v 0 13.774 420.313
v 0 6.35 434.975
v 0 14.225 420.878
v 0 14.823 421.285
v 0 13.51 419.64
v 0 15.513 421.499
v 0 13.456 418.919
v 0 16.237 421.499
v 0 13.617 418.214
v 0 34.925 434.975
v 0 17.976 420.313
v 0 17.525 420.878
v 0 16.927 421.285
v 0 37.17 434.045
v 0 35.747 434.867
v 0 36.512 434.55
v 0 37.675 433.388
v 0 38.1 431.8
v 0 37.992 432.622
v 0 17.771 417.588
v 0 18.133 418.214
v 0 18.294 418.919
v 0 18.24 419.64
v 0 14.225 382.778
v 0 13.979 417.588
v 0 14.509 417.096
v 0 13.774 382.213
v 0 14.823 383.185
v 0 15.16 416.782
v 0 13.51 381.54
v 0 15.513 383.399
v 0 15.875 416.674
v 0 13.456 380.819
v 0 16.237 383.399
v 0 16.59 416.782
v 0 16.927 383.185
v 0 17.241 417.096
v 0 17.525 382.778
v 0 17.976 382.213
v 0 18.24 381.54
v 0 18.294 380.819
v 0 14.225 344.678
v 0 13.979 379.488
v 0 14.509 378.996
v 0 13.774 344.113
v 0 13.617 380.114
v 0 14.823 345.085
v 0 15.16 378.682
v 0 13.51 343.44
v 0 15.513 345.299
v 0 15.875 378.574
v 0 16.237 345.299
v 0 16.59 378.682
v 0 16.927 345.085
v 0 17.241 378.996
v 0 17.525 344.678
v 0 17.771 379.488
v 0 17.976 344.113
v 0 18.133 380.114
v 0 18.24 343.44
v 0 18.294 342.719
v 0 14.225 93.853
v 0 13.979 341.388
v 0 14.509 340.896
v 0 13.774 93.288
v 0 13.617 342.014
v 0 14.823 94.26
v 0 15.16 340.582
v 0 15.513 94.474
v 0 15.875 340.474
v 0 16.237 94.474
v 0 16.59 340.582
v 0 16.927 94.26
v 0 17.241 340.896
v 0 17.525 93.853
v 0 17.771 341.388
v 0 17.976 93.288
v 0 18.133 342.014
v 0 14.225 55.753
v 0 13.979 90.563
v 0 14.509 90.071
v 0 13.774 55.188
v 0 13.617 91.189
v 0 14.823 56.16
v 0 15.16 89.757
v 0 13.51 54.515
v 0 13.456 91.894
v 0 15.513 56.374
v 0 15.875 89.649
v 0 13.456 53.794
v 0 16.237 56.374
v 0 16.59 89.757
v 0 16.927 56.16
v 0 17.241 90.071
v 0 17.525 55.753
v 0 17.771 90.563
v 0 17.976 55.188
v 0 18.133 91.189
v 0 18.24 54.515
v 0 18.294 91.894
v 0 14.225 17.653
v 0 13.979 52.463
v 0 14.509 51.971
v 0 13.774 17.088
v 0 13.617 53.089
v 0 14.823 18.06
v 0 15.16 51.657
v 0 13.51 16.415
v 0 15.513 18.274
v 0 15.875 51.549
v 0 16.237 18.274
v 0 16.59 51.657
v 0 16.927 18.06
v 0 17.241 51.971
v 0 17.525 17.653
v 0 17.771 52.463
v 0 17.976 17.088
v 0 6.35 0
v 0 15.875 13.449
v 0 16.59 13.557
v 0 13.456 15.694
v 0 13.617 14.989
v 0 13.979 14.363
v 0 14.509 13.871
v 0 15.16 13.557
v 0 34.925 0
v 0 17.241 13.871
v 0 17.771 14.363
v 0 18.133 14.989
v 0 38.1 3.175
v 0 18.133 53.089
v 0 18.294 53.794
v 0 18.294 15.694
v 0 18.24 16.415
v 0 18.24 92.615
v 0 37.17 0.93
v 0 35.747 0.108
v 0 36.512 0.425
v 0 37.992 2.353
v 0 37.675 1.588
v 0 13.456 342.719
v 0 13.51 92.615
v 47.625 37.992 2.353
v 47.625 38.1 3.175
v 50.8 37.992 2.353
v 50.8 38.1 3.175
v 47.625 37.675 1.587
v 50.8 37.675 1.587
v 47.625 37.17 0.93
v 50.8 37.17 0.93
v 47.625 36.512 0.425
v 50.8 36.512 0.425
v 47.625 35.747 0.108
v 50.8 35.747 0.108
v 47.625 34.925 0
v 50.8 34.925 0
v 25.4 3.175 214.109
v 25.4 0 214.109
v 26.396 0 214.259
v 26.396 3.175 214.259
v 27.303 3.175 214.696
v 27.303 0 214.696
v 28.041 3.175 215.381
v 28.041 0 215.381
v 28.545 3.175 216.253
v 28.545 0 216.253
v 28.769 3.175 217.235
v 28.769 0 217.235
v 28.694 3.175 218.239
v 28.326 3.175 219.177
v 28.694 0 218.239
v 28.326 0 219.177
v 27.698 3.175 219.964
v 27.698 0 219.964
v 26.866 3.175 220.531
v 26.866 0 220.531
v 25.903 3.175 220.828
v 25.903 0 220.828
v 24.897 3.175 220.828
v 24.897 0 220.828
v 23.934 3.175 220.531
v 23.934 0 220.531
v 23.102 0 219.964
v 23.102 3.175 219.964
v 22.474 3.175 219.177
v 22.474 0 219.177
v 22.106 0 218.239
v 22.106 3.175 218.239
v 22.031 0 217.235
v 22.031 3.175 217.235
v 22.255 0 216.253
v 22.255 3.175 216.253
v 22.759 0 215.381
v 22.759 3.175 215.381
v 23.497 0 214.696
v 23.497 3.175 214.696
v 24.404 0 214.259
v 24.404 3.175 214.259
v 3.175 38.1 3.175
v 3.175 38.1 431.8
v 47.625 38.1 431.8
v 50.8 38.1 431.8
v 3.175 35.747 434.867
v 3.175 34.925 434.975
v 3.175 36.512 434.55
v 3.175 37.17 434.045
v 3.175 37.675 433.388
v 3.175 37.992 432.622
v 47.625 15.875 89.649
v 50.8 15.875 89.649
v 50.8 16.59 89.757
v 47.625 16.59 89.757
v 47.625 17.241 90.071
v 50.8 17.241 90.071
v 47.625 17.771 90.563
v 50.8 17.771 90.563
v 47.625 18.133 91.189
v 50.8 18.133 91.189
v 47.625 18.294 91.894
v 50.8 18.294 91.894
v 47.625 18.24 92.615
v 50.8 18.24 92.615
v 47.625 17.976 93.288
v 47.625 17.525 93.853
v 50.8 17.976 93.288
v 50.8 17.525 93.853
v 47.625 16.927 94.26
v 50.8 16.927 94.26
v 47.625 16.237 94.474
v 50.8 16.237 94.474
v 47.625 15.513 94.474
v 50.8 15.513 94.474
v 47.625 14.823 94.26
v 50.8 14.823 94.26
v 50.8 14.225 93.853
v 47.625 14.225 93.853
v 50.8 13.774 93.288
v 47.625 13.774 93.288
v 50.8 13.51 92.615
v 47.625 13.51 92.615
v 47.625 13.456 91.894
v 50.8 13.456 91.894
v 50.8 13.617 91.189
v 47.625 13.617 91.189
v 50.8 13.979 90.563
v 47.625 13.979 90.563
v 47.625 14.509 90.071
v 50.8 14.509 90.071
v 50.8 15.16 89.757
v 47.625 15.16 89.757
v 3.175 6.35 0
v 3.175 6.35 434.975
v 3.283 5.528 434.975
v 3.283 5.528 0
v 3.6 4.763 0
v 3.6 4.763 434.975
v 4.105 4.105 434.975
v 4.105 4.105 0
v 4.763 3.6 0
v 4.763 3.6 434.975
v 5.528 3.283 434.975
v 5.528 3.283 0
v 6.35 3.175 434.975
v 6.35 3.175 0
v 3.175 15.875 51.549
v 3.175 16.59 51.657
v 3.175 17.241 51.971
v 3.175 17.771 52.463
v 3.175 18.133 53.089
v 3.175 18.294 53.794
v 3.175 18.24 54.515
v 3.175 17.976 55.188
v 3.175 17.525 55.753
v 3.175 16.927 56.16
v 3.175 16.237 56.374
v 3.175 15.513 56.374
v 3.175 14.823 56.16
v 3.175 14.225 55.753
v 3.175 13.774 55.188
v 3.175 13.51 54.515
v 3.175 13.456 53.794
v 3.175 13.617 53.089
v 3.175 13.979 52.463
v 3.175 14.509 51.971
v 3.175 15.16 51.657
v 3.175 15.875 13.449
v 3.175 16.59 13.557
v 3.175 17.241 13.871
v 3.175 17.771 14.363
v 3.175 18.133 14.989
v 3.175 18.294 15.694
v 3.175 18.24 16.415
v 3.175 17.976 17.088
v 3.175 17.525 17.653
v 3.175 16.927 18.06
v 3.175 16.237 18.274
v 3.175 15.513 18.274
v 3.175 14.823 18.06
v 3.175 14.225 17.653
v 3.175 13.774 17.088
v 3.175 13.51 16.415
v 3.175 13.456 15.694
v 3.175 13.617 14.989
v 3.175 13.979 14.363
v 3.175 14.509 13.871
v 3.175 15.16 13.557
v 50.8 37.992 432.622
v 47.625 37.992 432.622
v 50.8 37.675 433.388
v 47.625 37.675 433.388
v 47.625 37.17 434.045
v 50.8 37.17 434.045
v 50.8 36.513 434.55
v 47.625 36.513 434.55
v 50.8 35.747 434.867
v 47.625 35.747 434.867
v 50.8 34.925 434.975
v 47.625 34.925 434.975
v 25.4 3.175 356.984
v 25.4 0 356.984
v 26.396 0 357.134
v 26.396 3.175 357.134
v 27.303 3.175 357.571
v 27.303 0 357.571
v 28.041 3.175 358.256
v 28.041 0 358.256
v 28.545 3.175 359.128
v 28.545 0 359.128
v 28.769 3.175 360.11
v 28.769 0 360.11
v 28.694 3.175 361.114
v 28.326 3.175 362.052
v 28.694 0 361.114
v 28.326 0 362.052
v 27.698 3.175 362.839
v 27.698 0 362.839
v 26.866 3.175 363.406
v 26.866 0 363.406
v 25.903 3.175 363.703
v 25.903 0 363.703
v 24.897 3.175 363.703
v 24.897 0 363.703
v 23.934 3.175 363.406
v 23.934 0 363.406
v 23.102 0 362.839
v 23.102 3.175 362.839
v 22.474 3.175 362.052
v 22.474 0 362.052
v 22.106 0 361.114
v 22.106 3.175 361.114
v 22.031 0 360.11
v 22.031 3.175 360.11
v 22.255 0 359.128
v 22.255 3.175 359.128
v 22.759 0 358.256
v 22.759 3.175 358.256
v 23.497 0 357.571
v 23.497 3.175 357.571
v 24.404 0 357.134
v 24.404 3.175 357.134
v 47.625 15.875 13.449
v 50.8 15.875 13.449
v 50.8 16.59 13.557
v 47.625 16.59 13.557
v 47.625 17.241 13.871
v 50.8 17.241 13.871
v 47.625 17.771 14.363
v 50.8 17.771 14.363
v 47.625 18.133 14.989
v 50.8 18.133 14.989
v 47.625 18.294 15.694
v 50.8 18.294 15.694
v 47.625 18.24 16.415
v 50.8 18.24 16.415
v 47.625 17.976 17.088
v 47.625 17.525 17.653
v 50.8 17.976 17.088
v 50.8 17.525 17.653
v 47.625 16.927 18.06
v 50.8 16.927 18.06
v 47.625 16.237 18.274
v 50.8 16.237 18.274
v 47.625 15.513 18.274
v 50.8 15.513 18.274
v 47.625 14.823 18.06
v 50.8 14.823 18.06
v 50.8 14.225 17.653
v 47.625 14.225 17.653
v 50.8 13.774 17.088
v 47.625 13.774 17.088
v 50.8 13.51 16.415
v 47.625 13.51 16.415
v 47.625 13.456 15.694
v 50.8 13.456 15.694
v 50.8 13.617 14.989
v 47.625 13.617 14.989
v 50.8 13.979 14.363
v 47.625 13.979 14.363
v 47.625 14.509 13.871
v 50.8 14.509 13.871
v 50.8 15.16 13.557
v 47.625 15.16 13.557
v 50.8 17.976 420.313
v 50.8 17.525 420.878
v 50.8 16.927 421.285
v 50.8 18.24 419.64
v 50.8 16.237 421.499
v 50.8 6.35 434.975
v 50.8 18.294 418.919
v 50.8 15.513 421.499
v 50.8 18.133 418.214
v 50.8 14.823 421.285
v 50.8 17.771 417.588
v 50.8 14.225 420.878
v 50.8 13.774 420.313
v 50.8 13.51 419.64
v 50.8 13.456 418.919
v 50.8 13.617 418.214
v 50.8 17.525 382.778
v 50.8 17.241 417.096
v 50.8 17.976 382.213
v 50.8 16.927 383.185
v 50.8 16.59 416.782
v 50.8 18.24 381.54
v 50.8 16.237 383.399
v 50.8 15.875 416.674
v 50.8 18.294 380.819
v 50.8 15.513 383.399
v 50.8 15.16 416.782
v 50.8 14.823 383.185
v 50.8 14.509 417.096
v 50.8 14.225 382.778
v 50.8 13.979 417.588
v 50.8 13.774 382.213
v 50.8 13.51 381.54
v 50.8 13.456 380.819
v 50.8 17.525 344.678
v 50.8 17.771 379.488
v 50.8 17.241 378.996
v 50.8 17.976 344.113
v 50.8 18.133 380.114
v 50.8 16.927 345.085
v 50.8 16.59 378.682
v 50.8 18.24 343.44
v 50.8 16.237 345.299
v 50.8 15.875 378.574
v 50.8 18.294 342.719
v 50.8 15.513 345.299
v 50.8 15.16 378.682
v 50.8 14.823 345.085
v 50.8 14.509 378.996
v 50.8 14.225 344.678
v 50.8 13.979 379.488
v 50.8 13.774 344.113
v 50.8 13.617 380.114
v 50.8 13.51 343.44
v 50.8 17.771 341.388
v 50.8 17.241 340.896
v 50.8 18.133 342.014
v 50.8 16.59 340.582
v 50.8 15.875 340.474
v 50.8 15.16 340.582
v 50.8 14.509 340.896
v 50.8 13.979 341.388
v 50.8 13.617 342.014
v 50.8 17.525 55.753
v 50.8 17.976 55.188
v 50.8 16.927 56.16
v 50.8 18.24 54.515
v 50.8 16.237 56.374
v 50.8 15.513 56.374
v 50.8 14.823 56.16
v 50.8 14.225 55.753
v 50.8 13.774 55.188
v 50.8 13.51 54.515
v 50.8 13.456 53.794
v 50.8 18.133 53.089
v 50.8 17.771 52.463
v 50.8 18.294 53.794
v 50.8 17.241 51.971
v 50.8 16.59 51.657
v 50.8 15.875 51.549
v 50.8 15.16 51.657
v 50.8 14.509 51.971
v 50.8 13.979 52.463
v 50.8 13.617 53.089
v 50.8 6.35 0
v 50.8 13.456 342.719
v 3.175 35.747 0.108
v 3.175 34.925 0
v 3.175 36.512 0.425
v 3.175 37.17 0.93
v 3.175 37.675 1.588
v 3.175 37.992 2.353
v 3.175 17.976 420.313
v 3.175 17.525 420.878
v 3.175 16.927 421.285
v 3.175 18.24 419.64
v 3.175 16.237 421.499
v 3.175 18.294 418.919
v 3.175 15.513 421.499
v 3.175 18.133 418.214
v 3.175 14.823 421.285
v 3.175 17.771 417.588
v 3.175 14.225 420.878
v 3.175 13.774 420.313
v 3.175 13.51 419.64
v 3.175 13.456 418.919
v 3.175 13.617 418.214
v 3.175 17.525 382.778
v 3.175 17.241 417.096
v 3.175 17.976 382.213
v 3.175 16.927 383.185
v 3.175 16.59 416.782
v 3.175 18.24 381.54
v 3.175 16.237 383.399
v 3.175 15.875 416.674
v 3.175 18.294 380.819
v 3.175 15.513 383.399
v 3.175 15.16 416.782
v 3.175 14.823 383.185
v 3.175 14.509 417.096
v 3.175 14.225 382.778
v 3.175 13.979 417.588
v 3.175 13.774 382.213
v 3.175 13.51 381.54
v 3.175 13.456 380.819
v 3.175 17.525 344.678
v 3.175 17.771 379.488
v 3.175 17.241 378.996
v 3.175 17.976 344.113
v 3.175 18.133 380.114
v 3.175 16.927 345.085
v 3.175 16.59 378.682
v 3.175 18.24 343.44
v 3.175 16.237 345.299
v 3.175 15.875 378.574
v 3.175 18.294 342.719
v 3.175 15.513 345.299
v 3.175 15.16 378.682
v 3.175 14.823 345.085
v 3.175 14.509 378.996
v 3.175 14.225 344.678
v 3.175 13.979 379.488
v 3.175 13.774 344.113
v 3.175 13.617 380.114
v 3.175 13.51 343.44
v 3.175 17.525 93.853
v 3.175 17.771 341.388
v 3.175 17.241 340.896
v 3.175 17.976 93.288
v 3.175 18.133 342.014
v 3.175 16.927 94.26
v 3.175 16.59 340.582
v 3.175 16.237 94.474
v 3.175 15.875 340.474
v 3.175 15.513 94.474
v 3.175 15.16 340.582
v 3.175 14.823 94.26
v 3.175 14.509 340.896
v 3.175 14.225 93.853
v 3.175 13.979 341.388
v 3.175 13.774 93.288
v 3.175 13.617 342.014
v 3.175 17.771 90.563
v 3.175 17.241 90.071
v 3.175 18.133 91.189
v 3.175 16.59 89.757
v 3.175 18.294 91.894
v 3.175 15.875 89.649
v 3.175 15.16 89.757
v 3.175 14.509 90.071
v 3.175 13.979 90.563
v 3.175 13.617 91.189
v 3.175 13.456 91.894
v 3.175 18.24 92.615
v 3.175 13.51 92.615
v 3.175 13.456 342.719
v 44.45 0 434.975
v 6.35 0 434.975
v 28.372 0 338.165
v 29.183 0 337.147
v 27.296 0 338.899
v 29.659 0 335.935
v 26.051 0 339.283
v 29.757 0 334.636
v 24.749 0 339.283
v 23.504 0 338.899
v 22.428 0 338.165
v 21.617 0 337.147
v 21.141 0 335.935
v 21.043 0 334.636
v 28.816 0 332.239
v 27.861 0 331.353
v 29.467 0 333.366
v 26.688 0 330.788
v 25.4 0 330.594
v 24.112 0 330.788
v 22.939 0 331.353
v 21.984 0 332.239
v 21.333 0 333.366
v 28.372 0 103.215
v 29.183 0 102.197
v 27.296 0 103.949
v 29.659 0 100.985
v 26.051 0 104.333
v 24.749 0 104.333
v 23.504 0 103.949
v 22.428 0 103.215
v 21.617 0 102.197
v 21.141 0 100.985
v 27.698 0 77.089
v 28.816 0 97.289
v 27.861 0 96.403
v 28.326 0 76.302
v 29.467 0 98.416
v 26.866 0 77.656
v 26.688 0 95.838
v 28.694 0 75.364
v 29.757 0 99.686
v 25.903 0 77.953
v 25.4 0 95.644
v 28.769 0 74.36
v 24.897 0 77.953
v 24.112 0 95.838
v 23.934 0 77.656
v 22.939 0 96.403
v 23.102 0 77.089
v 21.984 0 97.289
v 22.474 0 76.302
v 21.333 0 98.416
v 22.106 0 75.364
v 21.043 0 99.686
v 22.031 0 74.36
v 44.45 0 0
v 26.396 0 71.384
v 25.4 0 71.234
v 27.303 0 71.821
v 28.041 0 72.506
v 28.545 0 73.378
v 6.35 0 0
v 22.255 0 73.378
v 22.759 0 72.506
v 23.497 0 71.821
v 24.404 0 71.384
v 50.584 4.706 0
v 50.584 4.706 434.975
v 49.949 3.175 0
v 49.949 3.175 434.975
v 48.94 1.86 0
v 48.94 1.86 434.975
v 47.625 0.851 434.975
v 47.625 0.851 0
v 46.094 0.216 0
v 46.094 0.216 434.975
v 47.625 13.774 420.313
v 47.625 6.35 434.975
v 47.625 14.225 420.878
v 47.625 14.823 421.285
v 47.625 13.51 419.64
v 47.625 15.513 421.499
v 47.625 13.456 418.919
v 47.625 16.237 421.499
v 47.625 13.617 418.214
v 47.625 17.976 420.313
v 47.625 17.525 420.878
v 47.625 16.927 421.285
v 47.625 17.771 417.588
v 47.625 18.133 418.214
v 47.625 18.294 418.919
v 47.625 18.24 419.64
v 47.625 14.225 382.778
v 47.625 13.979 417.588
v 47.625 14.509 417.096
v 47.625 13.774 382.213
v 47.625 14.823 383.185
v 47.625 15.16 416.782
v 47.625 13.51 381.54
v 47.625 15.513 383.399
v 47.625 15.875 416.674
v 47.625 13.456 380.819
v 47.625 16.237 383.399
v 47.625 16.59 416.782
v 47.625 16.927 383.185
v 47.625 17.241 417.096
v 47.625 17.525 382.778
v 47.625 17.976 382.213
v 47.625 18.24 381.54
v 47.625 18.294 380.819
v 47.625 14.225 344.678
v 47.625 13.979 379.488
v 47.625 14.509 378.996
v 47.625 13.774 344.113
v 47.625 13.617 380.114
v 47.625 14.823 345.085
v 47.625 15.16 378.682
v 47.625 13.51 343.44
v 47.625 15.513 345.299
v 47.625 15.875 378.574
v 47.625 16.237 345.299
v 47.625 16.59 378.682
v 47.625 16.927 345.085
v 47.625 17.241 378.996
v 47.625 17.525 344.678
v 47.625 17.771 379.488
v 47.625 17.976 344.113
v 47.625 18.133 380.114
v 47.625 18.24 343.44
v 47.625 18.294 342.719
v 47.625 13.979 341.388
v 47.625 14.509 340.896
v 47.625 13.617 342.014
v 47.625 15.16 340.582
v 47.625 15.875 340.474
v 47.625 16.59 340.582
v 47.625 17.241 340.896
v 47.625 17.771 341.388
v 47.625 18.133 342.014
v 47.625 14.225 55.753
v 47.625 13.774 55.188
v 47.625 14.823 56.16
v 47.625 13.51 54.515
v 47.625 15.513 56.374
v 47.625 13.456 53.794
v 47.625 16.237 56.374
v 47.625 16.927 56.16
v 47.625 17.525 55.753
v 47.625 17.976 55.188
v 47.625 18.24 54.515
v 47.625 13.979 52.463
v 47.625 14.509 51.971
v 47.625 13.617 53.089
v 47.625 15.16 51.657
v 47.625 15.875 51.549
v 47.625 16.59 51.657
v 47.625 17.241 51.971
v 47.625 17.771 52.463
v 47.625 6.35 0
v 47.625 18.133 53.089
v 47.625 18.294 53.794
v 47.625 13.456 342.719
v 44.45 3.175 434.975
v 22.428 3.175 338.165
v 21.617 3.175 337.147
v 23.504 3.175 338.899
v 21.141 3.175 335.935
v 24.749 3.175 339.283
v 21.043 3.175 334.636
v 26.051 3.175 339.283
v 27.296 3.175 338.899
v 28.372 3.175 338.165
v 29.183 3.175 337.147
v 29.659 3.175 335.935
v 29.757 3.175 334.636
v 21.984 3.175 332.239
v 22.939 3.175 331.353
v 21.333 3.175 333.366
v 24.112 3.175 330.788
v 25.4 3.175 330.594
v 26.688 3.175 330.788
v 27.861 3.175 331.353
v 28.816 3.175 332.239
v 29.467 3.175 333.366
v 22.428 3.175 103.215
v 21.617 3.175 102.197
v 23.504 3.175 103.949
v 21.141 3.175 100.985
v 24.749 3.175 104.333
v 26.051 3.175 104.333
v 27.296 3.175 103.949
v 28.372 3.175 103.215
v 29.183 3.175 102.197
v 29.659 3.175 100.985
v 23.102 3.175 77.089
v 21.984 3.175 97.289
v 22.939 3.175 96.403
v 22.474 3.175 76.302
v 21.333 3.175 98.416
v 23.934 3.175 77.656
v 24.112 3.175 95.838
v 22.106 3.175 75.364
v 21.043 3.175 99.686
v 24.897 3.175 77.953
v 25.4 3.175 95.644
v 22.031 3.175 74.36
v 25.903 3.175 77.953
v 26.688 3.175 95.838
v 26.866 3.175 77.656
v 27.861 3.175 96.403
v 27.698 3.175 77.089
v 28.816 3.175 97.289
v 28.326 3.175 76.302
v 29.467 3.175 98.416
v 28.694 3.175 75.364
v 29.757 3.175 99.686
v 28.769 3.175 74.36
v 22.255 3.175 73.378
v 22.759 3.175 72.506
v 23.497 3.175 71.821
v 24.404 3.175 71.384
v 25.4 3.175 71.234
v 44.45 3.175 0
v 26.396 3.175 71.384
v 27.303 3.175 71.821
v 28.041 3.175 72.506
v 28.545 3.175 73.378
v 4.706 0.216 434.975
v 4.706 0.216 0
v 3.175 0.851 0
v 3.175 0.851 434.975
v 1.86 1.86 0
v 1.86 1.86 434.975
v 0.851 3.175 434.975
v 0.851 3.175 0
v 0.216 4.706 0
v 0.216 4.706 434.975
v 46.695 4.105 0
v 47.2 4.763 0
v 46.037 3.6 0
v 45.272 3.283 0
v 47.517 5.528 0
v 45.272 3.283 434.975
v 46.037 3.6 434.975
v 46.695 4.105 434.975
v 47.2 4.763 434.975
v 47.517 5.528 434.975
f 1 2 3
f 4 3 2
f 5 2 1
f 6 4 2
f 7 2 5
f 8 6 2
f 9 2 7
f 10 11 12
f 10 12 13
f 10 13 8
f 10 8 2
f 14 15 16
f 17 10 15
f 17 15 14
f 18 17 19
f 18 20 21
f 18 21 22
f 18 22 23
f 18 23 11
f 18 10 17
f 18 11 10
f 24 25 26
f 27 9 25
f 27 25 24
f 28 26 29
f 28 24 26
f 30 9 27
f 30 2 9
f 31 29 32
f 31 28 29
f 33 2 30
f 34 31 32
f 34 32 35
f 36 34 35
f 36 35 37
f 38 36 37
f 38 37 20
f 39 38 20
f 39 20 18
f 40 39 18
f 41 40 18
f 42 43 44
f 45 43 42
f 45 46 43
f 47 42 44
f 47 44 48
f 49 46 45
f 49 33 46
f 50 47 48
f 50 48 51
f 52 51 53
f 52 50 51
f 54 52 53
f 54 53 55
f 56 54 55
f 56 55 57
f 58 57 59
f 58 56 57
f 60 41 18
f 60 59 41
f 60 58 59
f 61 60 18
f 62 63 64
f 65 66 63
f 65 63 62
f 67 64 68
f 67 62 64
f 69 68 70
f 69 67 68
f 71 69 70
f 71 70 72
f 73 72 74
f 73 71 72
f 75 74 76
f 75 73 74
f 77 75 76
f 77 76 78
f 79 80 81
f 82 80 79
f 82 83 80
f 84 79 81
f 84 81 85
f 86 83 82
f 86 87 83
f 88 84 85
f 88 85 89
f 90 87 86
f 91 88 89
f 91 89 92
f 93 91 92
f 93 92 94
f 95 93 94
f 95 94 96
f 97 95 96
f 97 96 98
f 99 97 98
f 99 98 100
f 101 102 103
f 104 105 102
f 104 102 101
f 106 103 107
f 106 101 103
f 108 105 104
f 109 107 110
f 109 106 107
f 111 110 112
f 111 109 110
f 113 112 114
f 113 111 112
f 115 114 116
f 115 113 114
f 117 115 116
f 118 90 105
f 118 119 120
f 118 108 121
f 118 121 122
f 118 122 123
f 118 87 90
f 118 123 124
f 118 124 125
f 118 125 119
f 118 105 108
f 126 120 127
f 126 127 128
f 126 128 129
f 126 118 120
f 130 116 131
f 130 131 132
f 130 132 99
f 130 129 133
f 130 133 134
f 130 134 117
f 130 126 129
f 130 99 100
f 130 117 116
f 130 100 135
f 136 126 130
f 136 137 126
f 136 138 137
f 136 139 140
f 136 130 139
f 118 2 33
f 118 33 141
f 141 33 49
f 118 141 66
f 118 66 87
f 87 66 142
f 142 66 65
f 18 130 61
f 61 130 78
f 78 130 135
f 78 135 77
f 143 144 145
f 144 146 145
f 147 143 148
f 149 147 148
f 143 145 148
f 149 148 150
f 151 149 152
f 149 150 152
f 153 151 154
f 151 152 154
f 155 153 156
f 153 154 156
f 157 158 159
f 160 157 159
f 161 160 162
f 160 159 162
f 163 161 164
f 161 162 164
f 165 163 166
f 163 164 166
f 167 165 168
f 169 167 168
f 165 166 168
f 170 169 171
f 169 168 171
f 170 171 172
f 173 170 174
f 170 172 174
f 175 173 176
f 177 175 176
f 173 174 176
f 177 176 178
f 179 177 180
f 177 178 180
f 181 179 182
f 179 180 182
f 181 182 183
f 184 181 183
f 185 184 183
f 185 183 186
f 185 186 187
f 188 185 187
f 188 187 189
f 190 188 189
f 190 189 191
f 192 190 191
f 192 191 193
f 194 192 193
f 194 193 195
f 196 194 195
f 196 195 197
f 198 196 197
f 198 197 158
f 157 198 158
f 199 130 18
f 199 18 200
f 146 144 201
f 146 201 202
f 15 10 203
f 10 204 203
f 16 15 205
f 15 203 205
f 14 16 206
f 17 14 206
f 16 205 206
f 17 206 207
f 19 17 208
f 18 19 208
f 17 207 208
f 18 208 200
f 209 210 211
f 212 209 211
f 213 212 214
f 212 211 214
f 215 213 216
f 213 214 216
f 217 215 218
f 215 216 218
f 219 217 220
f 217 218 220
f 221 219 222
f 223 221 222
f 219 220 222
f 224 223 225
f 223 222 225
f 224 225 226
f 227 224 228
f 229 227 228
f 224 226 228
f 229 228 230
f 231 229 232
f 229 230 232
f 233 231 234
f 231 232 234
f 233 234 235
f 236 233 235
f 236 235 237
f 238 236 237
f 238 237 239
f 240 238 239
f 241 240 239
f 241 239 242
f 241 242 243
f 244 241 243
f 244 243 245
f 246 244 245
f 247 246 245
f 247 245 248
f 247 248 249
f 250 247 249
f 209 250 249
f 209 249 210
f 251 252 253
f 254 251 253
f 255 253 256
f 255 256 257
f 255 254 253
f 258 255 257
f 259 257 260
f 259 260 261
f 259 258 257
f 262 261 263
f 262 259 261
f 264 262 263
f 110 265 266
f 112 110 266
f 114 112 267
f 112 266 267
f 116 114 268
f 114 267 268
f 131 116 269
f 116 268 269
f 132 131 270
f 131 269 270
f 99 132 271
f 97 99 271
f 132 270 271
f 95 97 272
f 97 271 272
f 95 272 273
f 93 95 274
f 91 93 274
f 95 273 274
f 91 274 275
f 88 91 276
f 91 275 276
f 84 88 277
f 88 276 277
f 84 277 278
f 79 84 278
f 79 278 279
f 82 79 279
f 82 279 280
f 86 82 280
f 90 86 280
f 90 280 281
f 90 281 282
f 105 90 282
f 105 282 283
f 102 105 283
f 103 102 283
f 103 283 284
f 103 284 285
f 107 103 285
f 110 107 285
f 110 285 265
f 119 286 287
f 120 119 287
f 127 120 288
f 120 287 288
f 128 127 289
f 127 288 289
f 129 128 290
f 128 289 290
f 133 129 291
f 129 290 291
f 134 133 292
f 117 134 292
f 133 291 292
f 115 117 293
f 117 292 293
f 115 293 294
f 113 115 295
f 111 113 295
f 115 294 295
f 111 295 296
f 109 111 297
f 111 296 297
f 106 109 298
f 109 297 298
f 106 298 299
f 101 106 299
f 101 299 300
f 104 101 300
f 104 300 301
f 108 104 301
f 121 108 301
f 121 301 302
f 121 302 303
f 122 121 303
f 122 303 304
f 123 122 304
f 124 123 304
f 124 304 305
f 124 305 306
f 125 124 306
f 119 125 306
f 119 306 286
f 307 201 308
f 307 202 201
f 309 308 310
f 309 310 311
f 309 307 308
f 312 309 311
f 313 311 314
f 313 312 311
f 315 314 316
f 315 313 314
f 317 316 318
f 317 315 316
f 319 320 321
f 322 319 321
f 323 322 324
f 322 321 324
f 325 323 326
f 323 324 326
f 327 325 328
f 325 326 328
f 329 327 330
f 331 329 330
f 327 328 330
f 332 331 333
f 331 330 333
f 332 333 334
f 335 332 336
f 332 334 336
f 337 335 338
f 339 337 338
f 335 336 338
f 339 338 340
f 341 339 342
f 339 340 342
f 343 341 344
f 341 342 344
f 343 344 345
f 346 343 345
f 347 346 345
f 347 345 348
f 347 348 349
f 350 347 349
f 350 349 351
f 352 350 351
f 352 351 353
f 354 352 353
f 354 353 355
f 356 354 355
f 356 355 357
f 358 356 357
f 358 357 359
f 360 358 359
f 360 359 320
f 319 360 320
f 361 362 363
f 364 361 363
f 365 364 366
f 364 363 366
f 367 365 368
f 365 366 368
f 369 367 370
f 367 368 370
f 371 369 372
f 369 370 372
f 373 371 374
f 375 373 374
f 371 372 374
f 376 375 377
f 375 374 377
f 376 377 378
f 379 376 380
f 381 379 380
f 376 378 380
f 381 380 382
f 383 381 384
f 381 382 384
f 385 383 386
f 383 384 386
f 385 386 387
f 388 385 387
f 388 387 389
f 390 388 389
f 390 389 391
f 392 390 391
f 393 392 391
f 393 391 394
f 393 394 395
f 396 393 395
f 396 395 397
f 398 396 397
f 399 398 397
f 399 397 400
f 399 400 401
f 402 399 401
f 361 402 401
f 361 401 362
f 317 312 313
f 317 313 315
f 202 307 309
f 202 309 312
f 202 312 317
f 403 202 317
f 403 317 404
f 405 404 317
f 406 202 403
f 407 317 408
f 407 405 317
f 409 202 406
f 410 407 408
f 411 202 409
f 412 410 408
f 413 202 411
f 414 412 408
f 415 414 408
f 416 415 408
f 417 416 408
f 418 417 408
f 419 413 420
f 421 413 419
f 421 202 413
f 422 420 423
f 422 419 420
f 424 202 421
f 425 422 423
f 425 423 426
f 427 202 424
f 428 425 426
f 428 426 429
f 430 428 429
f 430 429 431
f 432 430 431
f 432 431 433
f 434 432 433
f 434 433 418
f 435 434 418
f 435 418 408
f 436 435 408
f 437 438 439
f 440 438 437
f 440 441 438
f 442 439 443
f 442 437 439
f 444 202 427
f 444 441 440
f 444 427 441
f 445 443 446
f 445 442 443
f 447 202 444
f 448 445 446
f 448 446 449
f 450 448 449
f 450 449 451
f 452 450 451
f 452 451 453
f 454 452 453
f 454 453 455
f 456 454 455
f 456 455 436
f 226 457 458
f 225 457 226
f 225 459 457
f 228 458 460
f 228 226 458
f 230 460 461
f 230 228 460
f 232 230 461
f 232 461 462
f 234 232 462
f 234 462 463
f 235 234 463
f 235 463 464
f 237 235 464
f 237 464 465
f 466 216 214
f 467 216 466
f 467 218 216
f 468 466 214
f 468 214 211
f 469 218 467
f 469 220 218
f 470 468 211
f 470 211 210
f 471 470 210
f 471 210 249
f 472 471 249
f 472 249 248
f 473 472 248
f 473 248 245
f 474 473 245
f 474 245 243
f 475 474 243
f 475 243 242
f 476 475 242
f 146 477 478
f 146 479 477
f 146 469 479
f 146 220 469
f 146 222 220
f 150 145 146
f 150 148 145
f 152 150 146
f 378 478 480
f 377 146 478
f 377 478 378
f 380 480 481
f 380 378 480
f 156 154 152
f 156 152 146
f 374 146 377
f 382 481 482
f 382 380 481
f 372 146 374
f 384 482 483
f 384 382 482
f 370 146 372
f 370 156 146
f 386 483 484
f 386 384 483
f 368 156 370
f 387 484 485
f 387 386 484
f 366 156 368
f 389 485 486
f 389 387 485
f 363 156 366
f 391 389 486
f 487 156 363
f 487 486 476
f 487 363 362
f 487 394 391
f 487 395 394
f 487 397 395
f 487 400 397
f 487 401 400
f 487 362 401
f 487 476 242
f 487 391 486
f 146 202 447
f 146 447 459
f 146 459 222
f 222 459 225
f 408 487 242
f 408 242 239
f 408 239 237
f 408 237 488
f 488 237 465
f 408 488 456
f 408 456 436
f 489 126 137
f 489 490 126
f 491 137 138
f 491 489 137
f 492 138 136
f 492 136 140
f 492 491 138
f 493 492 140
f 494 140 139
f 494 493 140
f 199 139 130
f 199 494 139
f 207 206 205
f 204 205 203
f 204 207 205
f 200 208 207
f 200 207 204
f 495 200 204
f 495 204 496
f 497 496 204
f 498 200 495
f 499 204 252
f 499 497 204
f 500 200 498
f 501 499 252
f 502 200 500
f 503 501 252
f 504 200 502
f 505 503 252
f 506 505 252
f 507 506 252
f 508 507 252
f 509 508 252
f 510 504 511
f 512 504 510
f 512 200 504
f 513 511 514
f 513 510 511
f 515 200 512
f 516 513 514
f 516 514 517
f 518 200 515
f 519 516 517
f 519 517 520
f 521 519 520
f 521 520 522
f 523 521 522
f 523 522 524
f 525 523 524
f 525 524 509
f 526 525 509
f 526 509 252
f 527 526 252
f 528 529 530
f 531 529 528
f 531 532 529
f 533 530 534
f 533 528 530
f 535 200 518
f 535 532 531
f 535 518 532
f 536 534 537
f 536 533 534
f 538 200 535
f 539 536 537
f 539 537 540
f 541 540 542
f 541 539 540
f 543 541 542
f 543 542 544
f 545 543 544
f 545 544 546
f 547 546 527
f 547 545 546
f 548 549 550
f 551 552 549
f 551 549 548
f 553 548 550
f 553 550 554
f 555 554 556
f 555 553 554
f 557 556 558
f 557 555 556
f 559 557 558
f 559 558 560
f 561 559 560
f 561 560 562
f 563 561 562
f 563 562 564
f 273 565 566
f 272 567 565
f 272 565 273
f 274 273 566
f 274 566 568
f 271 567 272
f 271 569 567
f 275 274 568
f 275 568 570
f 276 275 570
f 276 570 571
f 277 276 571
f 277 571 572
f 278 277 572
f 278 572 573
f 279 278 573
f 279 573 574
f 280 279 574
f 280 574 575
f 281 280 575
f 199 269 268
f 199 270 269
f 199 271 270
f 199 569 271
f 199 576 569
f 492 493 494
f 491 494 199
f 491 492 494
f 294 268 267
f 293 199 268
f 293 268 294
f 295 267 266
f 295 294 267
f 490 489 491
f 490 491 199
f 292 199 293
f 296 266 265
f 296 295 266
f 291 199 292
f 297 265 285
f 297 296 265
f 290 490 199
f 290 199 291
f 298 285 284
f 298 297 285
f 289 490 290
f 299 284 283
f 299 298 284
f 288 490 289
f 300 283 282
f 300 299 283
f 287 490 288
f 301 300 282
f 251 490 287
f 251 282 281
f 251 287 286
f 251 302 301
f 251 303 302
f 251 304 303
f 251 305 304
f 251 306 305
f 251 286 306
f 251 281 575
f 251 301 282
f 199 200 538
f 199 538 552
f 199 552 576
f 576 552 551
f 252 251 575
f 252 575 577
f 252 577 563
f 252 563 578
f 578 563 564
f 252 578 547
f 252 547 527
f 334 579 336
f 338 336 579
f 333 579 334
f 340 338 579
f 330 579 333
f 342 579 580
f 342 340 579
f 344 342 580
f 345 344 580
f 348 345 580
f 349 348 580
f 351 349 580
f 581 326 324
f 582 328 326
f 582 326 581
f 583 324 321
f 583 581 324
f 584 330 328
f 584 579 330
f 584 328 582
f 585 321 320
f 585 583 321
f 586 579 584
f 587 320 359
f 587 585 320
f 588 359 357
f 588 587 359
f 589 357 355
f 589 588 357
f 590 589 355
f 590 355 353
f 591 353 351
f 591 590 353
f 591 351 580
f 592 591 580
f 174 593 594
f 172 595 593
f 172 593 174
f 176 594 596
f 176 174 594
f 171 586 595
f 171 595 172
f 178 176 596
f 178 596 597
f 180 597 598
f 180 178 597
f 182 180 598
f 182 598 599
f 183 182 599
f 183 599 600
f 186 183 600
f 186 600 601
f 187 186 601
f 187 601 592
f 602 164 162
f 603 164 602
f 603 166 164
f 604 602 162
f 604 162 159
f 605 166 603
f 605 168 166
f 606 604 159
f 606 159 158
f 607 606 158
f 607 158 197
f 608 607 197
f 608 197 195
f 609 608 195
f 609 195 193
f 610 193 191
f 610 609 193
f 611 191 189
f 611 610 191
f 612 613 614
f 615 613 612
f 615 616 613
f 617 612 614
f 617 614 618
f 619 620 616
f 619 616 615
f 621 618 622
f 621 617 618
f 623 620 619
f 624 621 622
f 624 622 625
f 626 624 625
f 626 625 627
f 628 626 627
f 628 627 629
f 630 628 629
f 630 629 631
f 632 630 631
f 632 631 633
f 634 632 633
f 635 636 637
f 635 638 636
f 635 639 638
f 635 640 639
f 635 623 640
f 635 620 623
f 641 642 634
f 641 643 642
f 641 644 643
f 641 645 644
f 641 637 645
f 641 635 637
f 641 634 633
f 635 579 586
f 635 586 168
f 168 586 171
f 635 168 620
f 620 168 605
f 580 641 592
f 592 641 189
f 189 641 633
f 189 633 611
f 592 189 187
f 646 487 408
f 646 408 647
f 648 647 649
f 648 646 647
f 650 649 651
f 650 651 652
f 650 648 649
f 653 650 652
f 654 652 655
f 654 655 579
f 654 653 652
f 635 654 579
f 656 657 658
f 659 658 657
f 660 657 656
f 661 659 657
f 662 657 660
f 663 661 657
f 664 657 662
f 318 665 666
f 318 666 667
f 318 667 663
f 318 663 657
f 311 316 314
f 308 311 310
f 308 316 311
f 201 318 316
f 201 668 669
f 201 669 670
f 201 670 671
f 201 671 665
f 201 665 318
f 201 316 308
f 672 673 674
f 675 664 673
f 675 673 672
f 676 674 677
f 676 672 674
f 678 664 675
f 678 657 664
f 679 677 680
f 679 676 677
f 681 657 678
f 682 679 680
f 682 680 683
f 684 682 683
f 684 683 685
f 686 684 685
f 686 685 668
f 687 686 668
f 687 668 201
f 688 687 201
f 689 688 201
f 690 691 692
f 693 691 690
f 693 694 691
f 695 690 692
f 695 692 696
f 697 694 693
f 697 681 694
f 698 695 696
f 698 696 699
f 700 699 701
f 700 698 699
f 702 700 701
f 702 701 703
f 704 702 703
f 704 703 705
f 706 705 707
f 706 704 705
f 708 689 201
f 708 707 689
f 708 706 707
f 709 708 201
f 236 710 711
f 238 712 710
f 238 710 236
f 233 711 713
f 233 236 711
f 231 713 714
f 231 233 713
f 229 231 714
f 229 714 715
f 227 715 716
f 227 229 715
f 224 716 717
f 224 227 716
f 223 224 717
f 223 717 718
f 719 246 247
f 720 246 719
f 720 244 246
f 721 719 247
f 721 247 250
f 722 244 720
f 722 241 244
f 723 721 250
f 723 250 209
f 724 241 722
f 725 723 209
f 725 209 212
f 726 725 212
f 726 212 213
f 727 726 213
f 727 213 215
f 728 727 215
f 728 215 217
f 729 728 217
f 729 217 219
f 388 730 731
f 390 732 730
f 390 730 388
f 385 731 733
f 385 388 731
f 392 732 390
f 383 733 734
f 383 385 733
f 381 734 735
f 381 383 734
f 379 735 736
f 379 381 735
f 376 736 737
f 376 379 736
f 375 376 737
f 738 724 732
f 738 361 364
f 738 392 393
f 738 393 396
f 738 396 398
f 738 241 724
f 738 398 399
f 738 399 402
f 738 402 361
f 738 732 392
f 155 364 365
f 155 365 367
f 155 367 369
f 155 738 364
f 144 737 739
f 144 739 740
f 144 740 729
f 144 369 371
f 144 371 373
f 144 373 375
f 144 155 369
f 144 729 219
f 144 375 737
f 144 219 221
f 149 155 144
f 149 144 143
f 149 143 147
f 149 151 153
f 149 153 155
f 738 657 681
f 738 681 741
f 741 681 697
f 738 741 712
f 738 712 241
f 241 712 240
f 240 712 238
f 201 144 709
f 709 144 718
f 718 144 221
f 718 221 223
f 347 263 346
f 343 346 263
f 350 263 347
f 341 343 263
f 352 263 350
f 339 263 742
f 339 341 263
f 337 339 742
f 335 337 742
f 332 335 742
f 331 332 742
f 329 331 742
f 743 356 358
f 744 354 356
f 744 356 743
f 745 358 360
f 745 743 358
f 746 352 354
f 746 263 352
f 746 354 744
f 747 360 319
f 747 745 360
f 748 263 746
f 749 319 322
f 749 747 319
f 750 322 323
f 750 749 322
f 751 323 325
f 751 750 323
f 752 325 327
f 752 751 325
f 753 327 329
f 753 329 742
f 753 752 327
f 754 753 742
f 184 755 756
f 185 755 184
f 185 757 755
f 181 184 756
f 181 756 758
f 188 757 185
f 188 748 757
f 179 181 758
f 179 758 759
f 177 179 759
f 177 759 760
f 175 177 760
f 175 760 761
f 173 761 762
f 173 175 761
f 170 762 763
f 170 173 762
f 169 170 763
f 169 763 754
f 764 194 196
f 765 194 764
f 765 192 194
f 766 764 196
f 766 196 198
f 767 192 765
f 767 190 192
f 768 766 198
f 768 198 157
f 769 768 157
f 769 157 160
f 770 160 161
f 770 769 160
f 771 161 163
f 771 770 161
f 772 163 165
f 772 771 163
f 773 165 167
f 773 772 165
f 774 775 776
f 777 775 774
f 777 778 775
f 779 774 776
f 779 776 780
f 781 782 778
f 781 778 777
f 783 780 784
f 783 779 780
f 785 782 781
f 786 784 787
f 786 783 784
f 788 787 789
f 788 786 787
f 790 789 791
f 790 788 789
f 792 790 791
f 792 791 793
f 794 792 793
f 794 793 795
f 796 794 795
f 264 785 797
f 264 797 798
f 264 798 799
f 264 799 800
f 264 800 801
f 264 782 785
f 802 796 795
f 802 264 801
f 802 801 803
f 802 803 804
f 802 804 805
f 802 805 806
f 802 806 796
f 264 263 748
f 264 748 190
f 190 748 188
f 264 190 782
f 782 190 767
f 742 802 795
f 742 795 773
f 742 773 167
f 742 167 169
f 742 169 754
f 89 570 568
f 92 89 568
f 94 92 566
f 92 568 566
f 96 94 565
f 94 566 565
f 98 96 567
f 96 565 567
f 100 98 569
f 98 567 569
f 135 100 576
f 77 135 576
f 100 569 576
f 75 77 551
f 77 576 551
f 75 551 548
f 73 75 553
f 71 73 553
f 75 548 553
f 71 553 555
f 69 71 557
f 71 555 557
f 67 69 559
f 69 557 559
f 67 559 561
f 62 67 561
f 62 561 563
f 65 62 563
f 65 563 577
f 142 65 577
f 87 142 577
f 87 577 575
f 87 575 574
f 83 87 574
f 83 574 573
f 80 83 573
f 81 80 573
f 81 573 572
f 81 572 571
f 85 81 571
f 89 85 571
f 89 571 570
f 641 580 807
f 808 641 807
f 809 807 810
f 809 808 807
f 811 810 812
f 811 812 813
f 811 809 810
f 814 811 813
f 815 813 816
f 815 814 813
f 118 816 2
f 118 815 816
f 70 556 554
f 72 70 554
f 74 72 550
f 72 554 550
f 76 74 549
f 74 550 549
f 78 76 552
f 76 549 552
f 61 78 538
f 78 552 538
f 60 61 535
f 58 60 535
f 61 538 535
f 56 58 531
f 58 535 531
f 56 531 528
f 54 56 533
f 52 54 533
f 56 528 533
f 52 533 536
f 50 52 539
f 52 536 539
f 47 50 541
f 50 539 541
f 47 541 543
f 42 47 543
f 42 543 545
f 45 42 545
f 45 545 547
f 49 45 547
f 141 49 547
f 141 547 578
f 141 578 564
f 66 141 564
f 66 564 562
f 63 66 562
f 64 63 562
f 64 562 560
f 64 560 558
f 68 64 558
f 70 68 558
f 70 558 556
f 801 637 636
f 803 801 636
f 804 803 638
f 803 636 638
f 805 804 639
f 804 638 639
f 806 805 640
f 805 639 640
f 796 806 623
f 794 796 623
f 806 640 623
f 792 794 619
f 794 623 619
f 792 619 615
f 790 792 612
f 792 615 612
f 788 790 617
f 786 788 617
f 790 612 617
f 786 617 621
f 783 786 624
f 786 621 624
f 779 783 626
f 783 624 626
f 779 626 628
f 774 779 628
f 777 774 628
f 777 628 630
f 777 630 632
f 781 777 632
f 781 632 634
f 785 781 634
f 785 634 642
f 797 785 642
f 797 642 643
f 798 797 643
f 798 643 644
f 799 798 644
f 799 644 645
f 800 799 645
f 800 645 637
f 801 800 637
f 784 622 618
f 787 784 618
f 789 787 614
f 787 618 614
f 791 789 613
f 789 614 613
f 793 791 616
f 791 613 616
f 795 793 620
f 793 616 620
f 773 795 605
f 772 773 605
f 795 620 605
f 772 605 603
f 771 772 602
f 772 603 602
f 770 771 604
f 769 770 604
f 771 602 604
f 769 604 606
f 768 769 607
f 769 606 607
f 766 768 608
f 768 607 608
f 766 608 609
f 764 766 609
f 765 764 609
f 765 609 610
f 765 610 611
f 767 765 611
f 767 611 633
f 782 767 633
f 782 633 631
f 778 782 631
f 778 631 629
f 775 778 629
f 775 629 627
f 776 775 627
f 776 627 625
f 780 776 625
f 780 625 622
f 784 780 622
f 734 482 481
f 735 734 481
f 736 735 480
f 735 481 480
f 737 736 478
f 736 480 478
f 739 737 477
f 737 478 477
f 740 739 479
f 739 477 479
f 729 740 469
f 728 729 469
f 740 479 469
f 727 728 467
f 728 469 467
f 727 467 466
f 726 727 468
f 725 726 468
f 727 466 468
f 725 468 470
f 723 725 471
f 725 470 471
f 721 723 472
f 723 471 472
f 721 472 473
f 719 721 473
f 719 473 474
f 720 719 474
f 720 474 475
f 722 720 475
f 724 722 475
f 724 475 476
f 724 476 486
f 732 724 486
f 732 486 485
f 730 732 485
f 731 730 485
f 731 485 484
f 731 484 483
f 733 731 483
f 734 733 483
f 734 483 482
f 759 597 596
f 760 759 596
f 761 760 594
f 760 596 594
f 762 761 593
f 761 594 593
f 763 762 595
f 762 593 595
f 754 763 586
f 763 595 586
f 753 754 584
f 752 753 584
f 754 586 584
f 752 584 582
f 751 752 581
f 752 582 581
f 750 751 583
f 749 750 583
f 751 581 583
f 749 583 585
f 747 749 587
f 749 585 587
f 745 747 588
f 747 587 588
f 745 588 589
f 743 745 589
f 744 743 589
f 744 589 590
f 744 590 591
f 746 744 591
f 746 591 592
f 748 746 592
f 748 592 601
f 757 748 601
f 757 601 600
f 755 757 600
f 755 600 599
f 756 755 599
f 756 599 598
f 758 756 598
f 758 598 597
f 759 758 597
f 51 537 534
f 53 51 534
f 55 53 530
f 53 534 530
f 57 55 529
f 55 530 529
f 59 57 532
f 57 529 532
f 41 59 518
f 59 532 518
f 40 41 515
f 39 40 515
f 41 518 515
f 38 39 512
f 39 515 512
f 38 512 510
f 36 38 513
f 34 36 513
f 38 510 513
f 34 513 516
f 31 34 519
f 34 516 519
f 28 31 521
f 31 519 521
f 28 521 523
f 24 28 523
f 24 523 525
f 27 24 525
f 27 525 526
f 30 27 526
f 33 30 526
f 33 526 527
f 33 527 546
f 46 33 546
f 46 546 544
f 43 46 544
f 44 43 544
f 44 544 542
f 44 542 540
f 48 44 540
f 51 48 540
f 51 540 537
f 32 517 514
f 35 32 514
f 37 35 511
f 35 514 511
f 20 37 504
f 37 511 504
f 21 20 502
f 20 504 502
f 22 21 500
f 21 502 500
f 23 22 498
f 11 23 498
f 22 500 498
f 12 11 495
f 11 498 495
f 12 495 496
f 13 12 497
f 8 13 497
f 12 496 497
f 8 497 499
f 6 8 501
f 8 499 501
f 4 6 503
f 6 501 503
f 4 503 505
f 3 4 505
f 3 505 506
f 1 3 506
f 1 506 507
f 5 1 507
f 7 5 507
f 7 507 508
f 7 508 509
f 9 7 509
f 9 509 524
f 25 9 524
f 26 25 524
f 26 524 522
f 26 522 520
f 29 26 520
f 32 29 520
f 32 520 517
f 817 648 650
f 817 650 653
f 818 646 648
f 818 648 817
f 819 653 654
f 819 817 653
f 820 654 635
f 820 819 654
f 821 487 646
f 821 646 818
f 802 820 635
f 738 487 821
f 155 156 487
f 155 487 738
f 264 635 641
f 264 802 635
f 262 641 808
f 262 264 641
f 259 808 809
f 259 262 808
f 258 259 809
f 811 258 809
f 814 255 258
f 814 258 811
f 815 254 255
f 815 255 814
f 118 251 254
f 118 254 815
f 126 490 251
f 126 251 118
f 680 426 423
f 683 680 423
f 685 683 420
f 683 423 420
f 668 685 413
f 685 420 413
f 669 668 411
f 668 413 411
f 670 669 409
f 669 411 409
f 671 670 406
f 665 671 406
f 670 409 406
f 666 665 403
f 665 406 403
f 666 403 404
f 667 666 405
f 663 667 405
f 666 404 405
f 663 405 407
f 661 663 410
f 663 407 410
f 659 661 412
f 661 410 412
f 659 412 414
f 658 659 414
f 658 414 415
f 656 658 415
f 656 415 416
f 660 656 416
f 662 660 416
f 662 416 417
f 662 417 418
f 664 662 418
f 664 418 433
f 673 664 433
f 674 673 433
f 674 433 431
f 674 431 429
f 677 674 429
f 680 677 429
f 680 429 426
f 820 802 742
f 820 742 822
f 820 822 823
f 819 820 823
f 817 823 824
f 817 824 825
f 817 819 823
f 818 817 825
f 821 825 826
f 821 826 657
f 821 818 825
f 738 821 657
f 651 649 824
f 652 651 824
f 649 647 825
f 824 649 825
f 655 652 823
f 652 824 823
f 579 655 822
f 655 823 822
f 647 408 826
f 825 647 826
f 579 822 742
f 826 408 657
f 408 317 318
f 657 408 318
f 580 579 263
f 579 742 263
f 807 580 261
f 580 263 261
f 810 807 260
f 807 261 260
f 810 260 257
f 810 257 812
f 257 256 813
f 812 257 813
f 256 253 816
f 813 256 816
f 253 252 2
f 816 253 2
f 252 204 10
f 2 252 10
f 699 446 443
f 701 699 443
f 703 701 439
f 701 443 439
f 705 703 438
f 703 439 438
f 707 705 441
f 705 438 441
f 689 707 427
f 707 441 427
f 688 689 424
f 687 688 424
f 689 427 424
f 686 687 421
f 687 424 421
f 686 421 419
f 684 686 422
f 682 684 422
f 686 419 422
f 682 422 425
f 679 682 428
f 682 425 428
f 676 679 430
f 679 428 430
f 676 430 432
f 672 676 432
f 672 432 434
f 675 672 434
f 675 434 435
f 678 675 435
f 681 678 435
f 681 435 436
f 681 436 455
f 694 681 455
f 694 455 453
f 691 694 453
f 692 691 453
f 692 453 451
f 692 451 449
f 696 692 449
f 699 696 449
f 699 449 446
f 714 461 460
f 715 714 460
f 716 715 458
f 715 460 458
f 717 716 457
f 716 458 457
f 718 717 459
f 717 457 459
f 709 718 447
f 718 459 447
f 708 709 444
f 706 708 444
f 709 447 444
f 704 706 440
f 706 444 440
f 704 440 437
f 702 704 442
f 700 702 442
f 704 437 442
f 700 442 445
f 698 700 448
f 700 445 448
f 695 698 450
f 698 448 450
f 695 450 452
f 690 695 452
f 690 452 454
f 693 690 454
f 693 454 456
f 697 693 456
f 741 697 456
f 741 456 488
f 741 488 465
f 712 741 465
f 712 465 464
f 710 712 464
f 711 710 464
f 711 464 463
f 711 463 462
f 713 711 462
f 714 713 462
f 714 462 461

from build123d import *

# Parameters (mm, degrees)
BASE_FLANGE1_DEPTH = 434.975
SKETCH8_R          = 4.3688
SKETCH8_R_2        = 3.3782
CUT_EXTRUDE2_DEPTH = 440.585601021
SKETCH9_R          = 2.4257
CUT_EXTRUDE3_DEPTH = 440.585601021
FILLET1_R          = 3.175


# Sheet-metal steps are written as plain solids
with BuildPart() as part:
    # Sketch1 → Base-Flange1 (new body)
    with BuildSketch(Plane.XY):
        with BuildLine():
            Line((50.8, 38.1), (50.8, 6.35))
            ThreePointArc((50.8, 6.35), (48.940128061, 1.859871939), (44.45, 0))
            Line((44.45, 0), (6.35, 0))
            ThreePointArc((6.35, 0), (1.859871939, 1.859871939), (0, 6.35))
            Line((0, 6.35), (0, 38.1))
            Line((0, 38.1), (3.175, 38.1))
            Line((3.175, 38.1), (3.175, 6.35))
            ThreePointArc((3.175, 6.35), (4.10493597, 4.10493597), (6.35, 3.175))
            Line((6.35, 3.175), (44.45, 3.175))
            ThreePointArc((44.45, 3.175), (46.69506403, 4.10493597), (47.625, 6.35))
            Line((47.625, 6.35), (47.625, 38.1))
            Line((47.625, 38.1), (50.8, 38.1))
        make_face()
    extrude(amount=BASE_FLANGE1_DEPTH)

    # Sketch8 → Cut-Extrude2 (cut, through all)
    with BuildSketch(Plane.XZ):
        with Locations(Location((25.4, 100.0125, 0), (0, 0, 270))):
            Circle(SKETCH8_R)
        with Locations(Location((25.4, 334.9625, 0), (0, 0, 270))):
            Circle(SKETCH8_R)
        with Locations(Location((25.4, 217.4875, 0), (0, 0, 270))):
            Circle(SKETCH8_R_2)
        with Locations(Location((25.4, 74.6125, 0), (0, 0, 270))):
            Circle(SKETCH8_R_2)
        with Locations(Location((25.4, 360.3625, 0), (0, 0, 270))):
            Circle(SKETCH8_R_2)
    extrude(amount=-CUT_EXTRUDE2_DEPTH, mode=Mode.SUBTRACT)

    # Sketch9 → Cut-Extrude3 (cut, through all)
    with BuildSketch(Plane(origin=(50.8, 0, 0), x_dir=(0, 0, -1), z_dir=(1, 0, 0))):
        with Locations((-419.1, 15.875)):
            Circle(SKETCH9_R)
        with Locations((-381, 15.875)):
            Circle(SKETCH9_R)
        with Locations((-342.9, 15.875)):
            Circle(SKETCH9_R)
        with Locations((-92.075, 15.875)):
            Circle(SKETCH9_R)
        with Locations((-53.975, 15.875)):
            Circle(SKETCH9_R)
        with Locations((-15.875, 15.875)):
            Circle(SKETCH9_R)
    extrude(amount=-CUT_EXTRUDE3_DEPTH, mode=Mode.SUBTRACT)

    # Fillet1
    fillet1_edges = [part.edges().sort_by_distance(p)[0] for p in [
        (1.5875, 38.1, 0),
        (49.2125, 38.1, 0),
        (1.5875, 38.1, 434.975),
        (49.2125, 38.1, 434.975),
    ]]
    fillet(fillet1_edges, radius=FILLET1_R)


solid = part.part
